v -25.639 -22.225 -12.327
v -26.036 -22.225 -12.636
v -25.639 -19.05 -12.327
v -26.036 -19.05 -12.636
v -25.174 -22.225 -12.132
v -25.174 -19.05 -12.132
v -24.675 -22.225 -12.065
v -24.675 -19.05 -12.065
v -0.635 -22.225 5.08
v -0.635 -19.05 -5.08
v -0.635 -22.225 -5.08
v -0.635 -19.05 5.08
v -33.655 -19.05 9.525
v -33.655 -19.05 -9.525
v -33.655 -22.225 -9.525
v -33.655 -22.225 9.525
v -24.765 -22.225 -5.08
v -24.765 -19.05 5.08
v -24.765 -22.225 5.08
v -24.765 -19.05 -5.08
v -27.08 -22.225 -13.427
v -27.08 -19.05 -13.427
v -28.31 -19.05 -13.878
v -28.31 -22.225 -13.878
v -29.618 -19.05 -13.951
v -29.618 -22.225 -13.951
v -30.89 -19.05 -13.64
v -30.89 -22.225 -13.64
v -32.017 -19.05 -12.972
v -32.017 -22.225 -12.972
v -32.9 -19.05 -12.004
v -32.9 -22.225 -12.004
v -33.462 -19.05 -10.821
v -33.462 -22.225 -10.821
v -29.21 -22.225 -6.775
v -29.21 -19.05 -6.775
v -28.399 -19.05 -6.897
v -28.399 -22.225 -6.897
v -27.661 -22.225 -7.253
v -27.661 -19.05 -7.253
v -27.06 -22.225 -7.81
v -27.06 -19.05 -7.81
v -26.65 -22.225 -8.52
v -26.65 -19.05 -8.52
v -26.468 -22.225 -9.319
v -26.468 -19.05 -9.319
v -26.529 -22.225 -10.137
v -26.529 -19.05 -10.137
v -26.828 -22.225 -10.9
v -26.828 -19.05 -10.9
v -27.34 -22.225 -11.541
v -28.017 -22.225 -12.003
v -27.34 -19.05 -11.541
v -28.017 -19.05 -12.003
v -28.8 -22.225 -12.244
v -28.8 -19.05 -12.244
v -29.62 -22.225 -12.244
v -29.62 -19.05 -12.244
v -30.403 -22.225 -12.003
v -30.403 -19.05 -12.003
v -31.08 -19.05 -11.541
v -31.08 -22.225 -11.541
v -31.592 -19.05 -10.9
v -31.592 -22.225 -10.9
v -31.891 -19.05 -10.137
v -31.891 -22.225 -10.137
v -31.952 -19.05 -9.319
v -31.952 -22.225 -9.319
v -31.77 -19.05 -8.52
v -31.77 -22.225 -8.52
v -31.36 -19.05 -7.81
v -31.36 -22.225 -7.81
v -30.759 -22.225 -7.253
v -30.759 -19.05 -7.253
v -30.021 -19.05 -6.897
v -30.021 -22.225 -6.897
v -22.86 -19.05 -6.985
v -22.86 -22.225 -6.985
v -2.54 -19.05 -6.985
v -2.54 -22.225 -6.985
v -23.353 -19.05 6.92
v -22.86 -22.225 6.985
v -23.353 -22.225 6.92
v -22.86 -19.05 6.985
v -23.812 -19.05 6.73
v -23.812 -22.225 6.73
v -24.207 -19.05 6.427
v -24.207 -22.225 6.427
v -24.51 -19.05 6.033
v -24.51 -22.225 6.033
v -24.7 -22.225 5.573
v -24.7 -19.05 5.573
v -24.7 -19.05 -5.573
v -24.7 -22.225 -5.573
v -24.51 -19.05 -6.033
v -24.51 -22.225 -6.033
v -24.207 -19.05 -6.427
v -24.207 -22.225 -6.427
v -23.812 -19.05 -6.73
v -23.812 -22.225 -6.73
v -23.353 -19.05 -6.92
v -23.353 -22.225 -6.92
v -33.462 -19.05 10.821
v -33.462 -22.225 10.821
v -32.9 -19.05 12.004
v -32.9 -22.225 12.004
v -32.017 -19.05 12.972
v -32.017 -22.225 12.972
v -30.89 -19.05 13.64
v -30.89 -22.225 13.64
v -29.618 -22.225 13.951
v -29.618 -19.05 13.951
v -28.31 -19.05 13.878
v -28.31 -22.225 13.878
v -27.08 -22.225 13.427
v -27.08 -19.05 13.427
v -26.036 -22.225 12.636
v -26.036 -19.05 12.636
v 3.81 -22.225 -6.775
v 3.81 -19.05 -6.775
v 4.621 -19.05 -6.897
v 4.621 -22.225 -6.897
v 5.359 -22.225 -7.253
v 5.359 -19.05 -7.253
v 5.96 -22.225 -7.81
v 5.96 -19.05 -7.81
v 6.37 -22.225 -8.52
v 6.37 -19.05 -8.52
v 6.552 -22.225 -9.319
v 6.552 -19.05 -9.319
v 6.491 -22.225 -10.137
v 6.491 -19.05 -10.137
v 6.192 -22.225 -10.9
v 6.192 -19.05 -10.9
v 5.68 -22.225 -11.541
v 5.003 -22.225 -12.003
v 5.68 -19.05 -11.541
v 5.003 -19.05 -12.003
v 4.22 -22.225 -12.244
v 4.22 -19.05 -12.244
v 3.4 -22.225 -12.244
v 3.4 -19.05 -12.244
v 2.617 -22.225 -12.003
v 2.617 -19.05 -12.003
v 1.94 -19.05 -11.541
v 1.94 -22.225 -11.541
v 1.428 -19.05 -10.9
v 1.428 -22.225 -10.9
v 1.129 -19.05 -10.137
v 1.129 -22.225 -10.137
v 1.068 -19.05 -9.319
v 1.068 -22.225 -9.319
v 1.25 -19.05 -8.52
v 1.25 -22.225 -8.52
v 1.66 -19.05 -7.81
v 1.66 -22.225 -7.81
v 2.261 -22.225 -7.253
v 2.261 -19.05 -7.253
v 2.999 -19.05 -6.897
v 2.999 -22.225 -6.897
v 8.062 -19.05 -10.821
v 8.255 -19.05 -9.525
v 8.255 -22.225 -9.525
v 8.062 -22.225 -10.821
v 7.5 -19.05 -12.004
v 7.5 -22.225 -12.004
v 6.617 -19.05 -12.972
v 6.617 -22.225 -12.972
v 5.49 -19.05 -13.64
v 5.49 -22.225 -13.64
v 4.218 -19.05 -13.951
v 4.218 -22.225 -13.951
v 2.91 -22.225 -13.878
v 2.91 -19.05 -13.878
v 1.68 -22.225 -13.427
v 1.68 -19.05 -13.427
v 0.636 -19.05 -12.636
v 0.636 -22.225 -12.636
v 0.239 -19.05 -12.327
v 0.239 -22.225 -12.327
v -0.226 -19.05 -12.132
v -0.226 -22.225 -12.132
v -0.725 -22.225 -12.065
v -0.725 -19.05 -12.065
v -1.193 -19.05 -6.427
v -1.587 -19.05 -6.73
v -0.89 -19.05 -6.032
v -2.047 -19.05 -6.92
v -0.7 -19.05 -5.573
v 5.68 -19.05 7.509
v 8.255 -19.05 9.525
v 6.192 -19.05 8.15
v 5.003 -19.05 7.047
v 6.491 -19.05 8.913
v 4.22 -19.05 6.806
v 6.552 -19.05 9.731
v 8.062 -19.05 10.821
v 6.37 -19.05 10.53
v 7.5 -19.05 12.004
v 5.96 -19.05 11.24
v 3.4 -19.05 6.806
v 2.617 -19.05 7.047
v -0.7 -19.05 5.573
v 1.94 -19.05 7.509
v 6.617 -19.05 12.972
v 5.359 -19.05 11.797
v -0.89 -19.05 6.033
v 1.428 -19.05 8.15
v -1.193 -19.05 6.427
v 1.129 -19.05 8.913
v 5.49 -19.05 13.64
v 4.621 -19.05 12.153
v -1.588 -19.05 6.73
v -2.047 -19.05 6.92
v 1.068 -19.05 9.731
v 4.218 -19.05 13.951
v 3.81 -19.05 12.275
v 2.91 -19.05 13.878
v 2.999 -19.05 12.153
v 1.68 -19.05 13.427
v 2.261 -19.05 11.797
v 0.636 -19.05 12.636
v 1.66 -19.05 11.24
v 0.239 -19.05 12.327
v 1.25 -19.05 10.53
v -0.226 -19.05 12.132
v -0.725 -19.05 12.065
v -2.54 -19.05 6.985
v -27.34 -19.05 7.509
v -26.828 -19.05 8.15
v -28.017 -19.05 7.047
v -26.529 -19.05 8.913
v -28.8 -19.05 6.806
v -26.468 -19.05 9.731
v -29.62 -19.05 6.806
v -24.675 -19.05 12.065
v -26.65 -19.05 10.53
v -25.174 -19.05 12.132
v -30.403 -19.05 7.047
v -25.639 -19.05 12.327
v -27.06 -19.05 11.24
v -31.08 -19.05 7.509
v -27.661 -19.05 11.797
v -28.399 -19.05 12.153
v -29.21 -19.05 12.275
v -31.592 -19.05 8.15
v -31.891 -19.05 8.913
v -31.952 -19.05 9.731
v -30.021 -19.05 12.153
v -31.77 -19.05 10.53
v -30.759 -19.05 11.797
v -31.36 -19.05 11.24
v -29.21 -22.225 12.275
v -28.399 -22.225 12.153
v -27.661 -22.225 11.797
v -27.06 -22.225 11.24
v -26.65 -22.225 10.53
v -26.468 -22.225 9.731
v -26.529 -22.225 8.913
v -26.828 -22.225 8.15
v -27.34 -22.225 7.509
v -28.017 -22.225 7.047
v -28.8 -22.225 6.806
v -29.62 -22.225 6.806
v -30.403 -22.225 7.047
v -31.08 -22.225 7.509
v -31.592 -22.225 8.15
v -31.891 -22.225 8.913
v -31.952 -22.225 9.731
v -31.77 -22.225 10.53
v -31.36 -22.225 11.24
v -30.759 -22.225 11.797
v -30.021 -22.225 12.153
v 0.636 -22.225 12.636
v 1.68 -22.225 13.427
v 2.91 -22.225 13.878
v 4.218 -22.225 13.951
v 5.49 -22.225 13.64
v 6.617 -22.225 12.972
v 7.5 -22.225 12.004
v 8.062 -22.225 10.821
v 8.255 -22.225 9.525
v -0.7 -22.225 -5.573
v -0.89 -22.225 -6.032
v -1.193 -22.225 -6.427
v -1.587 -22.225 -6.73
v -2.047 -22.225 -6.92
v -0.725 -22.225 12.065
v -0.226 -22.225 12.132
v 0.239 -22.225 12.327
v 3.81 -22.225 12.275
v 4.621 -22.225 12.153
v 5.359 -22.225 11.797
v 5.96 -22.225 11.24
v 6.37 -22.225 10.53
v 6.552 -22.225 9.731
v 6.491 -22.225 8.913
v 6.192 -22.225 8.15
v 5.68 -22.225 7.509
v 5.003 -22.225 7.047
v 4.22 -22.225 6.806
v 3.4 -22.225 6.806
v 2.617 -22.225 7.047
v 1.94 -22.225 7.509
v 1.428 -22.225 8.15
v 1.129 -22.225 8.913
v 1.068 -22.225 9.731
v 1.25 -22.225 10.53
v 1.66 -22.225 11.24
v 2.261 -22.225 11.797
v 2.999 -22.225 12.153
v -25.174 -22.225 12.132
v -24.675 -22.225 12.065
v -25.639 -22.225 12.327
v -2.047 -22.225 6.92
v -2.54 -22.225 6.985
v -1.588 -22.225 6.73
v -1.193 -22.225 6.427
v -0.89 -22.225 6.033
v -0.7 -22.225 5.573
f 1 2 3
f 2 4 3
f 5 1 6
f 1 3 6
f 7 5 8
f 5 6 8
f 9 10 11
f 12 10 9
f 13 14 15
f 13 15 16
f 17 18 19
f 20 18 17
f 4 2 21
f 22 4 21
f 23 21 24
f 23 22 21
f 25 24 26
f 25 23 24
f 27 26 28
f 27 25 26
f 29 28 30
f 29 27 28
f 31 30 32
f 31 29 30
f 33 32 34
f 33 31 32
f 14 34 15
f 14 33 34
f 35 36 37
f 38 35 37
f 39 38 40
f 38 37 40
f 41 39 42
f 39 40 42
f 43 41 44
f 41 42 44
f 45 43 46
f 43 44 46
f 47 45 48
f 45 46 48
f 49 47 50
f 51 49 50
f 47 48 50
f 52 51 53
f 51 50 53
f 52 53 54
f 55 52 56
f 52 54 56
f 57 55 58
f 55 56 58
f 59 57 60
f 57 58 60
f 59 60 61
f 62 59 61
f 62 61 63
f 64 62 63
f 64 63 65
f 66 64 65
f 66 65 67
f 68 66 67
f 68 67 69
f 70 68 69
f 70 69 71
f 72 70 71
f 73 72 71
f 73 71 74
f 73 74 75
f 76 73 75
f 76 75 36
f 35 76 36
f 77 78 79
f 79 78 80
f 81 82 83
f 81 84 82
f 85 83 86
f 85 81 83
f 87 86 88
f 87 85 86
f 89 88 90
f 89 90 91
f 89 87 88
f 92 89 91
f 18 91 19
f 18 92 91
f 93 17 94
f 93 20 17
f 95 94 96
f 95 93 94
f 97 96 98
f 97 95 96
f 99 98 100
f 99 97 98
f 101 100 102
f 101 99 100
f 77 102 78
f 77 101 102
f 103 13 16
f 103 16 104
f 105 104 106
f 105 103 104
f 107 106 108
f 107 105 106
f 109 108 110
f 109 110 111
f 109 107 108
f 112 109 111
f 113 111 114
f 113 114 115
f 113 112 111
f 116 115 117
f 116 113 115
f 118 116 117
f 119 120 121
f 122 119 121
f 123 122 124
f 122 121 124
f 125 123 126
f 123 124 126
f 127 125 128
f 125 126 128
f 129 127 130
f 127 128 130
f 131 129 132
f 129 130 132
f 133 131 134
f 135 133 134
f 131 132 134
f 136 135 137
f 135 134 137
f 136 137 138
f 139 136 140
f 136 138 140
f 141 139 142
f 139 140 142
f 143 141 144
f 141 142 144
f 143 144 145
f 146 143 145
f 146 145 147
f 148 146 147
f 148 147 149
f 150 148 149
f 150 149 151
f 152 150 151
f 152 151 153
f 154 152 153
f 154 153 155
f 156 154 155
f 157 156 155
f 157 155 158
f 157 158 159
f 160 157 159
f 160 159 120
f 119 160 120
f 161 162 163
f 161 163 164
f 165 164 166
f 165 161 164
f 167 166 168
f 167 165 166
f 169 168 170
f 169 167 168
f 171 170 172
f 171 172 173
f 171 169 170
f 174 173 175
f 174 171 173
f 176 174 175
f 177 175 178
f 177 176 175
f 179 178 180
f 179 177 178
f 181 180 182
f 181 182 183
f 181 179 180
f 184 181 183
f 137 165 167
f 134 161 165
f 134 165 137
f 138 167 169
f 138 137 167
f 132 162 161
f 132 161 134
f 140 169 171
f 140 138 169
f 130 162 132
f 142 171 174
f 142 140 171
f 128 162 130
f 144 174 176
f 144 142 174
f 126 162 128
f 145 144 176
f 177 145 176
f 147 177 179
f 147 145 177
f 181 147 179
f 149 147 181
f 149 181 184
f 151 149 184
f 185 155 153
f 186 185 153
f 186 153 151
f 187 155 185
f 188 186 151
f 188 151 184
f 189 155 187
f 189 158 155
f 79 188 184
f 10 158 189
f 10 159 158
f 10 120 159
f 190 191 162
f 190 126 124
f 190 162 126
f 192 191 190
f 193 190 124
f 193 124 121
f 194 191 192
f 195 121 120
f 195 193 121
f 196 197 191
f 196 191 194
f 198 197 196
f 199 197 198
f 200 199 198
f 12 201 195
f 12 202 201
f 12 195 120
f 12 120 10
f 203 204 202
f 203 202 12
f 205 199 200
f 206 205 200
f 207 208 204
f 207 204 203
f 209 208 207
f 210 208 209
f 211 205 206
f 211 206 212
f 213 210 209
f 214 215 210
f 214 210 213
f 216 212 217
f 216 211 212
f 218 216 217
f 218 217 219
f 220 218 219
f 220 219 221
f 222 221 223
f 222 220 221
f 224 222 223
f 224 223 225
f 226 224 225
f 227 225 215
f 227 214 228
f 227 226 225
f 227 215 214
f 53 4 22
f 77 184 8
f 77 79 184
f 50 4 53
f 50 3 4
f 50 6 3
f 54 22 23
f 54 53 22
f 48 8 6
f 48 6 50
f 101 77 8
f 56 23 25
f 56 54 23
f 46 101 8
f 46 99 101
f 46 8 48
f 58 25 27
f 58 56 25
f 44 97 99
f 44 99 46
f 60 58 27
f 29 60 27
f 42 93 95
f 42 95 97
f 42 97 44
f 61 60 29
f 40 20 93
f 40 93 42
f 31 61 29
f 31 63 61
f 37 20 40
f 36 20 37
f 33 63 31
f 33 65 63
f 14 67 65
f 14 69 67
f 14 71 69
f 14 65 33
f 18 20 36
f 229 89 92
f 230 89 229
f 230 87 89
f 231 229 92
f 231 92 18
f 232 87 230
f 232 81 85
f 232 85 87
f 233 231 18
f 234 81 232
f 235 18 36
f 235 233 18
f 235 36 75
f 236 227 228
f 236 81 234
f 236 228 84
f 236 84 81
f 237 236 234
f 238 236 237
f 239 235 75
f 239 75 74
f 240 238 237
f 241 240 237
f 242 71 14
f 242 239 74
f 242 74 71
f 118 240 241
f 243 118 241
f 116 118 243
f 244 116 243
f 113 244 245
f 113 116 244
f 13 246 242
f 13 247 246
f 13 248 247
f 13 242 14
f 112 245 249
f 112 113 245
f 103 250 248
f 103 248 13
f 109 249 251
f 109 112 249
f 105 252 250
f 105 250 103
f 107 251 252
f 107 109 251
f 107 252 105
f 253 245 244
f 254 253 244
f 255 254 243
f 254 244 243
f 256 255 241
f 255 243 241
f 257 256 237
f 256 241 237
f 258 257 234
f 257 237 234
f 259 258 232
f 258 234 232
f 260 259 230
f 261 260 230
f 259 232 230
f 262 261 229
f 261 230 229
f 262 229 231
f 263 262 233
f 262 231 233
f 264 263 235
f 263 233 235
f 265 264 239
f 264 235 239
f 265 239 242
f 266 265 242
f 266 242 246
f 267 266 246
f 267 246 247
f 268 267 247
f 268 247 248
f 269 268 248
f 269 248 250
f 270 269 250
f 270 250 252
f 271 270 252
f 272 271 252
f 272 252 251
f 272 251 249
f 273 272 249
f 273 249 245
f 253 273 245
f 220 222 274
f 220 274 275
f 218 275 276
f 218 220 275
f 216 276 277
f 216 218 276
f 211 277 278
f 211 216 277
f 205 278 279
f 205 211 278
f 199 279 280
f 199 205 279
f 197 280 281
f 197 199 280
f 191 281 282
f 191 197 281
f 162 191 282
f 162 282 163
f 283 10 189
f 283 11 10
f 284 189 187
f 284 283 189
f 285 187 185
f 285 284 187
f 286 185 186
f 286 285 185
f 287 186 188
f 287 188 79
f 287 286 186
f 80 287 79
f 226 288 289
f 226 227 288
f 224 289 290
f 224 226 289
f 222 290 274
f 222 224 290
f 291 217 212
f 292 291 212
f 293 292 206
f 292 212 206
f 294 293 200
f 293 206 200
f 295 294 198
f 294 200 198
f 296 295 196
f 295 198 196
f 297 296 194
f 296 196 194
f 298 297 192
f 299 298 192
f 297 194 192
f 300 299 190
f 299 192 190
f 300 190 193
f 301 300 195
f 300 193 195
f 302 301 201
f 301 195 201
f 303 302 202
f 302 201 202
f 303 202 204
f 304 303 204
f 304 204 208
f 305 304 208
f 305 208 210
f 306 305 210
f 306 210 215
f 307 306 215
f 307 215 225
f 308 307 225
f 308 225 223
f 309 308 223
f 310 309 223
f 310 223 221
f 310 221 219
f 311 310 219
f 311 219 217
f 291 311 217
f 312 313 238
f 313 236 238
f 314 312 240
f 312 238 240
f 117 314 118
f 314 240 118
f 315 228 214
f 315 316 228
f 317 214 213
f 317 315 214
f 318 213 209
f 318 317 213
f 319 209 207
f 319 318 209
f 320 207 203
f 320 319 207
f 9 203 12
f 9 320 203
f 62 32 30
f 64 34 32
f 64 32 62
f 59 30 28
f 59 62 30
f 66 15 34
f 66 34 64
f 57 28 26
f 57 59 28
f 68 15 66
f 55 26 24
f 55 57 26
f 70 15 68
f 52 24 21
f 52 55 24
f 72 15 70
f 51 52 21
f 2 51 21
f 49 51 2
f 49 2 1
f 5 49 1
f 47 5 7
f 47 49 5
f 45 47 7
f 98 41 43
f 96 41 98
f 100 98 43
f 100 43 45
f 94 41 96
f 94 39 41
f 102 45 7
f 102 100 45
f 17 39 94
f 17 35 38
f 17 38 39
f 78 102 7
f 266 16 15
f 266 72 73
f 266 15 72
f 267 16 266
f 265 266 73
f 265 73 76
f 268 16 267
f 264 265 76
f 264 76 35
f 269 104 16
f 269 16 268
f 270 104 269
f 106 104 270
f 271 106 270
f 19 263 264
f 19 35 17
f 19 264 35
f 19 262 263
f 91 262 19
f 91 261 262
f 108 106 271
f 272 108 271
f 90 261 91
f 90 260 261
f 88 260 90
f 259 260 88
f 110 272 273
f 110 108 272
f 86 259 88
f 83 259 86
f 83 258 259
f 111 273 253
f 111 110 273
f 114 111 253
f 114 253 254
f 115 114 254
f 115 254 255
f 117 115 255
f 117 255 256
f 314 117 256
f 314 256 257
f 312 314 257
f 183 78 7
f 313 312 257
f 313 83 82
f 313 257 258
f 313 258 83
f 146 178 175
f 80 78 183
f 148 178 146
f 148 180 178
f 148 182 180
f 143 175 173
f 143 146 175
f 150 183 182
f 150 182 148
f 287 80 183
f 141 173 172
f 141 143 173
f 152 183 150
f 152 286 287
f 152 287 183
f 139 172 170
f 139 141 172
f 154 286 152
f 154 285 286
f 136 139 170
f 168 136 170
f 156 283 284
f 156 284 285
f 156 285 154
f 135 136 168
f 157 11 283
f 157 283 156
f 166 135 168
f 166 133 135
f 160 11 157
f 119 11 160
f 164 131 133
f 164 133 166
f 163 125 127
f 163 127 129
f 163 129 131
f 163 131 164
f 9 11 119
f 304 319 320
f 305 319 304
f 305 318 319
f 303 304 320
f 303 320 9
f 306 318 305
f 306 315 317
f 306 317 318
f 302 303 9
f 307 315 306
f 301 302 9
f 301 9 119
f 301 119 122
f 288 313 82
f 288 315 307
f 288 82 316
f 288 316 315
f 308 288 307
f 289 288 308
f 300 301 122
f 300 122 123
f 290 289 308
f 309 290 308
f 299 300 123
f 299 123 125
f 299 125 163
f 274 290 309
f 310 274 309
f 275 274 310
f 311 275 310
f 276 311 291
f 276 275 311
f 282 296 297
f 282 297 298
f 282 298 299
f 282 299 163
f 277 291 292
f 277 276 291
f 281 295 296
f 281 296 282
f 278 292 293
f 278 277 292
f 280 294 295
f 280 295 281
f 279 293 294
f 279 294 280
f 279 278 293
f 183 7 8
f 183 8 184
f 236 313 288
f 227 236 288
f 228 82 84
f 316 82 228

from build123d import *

# Parameters (mm, degrees)
BOSS_EXTRUDE2_DEPTH   = 3.175
BOSS_EXTRUDE2_2_DEPTH = 3.175
SKETCH7_W             = 33.02
SKETCH7_H             = 5.08
EXTRUDE_THIN1_DEPTH   = 3.175
M5_CLEARANCE_HOLE1_D  = 5.5
FILLET1_R             = 1.905


with BuildPart() as part:
    # Sketch1 → Boss-Extrude2 (new body)
    with BuildSketch(Plane.XZ.offset(19.05)):
        with BuildLine():
            Line((-24.765, 9.525), (-24.765, -9.525))
            ThreePointArc((-24.765, -9.525), (-29.21, -13.97), (-33.655, -9.525))
            Line((-33.655, -9.525), (-33.655, 9.525))
            ThreePointArc((-33.655, 9.525), (-29.21, 13.97), (-24.765, 9.525))
        make_face()
    extrude(amount=BOSS_EXTRUDE2_DEPTH)



with BuildPart() as body_2:
    # Sketch1 → Boss-Extrude2 2 (new body)
    with BuildSketch(Plane.XZ.offset(19.05)):
        with BuildLine():
            Line((8.255, 9.525), (8.255, -9.525))
            ThreePointArc((8.255, -9.525), (3.81, -13.97), (-0.635, -9.525))
            Line((-0.635, -9.525), (-0.635, 9.525))
            ThreePointArc((-0.635, 9.525), (3.81, 13.97), (8.255, 9.525))
        make_face()
    extrude(amount=BOSS_EXTRUDE2_2_DEPTH)


with BuildPart() as part_1:
    add(part.part)

    add(body_2.part)  # Extrude-Thin1 merges body 2
    # Sketch7 → Extrude-Thin1 (add)
    with BuildSketch(Plane.XZ.offset(22.225)):
        with Locations((-12.7, 9.525)):
            Rectangle(SKETCH7_W, SKETCH7_H)
        with Locations((-12.7, -9.525)):
            Rectangle(SKETCH7_W, SKETCH7_H)
    extrude(amount=-EXTRUDE_THIN1_DEPTH)

    # M5 Clearance Hole1 (through all)
    with Locations(Plane(origin=(-29.21, -22.225, 9.525), x_dir=(0, 0, -1), z_dir=(0, -1, 0))):
        with Locations((0, 0), (19.05, 0), (0, 33.02), (19.05, 33.02)):
            Hole(M5_CLEARANCE_HOLE1_D / 2)

    # Fillet1
    fillet1_edges = [part_1.edges().sort_by_distance(p)[0] for p in [
        (-25.562202719, -20.6375, 12.065),
        (-24.765, -20.6375, 6.985),
        (-0.635, -20.6375, 6.985),
        (0.162202719, -20.6375, 12.065),
        (0.162202719, -20.6375, -12.065),
        (-0.635, -20.6375, -6.985),
        (-24.765, -20.6375, -6.985),
        (-25.562202719, -20.6375, -12.065),
    ]]
    fillet(fillet1_edges, radius=FILLET1_R)


solid = part_1.part
